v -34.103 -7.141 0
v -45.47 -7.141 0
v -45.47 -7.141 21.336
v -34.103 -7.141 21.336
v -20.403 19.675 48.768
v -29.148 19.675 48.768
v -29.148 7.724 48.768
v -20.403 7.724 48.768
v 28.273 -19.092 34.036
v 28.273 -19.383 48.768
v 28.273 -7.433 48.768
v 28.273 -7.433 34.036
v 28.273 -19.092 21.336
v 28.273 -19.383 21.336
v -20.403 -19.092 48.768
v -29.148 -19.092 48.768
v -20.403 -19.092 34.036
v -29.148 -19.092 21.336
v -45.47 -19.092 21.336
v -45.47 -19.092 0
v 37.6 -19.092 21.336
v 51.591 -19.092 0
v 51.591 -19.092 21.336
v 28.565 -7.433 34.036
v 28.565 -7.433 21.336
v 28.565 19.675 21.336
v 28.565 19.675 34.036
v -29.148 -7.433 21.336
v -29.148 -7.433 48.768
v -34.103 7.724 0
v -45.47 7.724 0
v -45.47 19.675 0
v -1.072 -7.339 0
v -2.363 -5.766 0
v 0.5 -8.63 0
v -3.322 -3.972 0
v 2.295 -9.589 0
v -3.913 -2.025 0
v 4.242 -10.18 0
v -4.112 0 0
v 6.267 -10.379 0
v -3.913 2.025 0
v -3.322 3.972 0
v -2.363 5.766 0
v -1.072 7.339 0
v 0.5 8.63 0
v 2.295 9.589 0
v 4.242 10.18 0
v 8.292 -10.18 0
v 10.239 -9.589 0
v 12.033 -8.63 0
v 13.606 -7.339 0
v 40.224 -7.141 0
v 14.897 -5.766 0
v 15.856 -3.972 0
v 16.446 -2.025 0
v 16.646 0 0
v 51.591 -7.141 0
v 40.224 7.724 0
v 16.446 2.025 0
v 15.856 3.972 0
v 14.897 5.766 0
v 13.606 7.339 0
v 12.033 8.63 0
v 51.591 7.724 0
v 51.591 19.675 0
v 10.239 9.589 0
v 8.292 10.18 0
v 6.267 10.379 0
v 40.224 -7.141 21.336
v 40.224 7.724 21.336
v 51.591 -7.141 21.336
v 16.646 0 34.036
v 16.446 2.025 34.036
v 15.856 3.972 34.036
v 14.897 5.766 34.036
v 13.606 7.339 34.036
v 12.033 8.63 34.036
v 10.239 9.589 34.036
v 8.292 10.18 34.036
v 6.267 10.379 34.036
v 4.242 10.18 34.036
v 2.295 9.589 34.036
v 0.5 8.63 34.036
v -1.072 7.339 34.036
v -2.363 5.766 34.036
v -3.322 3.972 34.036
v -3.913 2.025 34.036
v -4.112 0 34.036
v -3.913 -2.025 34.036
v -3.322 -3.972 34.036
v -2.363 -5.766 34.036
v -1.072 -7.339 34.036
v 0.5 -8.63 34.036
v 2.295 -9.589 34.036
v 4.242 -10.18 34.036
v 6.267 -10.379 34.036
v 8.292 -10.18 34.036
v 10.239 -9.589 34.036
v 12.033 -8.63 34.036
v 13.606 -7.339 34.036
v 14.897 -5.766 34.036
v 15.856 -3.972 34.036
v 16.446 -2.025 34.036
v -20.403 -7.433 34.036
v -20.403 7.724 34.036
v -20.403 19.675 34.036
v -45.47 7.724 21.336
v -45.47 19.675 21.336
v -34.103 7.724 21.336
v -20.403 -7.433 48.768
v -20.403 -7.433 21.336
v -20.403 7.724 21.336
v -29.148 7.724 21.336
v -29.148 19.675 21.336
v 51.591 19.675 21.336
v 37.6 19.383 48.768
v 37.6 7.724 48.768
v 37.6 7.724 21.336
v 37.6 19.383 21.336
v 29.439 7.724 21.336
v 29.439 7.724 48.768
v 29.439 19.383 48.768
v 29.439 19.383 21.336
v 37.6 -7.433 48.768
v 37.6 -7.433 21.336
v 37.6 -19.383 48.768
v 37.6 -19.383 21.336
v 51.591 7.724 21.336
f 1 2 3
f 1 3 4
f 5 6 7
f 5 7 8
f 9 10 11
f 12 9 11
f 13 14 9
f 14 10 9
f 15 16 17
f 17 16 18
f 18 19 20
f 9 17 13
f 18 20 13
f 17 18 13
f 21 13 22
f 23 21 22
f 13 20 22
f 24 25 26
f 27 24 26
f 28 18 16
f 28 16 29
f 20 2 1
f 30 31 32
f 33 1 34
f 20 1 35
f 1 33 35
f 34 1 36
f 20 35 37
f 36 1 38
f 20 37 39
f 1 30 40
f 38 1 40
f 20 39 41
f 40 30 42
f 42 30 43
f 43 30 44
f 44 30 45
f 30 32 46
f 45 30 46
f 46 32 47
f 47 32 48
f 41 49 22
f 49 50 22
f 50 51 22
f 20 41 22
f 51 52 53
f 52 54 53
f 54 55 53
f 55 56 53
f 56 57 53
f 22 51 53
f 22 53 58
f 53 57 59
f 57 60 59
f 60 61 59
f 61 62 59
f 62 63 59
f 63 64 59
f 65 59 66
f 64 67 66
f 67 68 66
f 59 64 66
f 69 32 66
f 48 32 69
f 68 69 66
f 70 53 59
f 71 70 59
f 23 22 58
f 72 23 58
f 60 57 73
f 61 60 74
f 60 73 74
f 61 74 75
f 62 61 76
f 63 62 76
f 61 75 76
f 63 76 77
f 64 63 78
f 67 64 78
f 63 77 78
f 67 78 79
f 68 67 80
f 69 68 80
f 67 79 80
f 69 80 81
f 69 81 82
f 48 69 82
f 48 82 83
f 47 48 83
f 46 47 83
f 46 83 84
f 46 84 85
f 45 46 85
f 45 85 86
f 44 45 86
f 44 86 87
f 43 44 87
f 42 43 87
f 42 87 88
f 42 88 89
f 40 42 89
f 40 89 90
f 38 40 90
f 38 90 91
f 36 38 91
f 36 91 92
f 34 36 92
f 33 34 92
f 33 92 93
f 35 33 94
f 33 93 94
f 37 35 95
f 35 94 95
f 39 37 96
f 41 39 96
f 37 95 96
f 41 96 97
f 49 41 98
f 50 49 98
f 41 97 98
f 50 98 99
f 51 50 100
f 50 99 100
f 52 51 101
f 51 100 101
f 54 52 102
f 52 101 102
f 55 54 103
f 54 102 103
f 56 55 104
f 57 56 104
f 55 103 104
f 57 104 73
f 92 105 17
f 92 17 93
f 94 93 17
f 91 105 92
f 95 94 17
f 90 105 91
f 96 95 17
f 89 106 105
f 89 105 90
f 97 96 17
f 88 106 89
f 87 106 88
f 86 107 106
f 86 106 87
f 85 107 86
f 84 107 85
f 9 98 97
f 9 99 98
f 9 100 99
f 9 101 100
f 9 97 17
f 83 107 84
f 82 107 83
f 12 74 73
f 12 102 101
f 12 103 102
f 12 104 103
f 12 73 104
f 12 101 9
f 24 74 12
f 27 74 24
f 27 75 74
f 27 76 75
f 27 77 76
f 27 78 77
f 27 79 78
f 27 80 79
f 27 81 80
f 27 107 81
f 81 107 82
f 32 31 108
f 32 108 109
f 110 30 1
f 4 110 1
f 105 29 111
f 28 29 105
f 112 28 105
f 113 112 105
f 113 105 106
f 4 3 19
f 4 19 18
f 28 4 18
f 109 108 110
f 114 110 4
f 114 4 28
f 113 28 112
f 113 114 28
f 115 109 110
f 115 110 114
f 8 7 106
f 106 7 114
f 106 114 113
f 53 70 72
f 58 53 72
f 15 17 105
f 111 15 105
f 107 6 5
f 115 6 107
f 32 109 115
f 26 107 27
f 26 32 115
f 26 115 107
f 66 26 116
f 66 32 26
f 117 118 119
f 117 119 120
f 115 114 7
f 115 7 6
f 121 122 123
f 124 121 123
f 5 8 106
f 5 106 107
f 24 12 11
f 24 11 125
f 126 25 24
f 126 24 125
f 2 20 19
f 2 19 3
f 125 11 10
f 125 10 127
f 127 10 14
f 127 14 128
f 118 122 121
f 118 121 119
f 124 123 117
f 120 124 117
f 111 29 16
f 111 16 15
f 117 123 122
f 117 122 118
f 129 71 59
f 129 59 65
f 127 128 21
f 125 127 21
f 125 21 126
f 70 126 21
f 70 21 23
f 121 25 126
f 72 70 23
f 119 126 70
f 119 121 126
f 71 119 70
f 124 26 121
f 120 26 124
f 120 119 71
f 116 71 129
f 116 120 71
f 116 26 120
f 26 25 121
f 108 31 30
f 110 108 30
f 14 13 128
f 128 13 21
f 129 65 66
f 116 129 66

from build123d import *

# Parameters (mm, degrees)
F0_W     = 11.3675408065
F0_H     = 11.9504919276
F0_W_2   = 11.3675370812
F0_H_2   = 11.9504933245
F1_DEPTH = 21.336
F2_W     = 48.9678680897
F2_H     = 38.7662313879
F3_DEPTH = 12.7
F4_W     = 8.7442621589
F4_H     = 11.9504933245
F4_H_2   = 11.659016367
F4_W_2   = 8.1613156945
F4_H_3   = 11.6590172984
F4_W_3   = 9.3272179365
F4_H_4   = 11.9504923932
F5_DEPTH = 27.432
F6_R     = 10.3791447845
F7_DEPTH = 76.2


with BuildPart() as f1:
    # F0 (on Top) → F1 (new body)
    with BuildSketch(Plane.XY):
        Polygon((-34.1026224196, -7.1411477402), (-34.1026224196, -19.0916396677), (40.2236096561, -19.0916396677), (40.2236096561, -7.1411477402), (40.2236096561, 7.7240983956), (40.2236096561, 19.6745917201), (-34.1026224196, 19.6745917201), (-34.1026224196, 7.7240983956), align=None)
        with Locations((-39.7863928229, -13.116393704)):
            Rectangle(F0_W, F0_H)
        with Locations((45.9073781967, -13.116393704)):
            Rectangle(F0_W_2, F0_H)
        with Locations((-39.7863928229, 13.6993450578)):
            Rectangle(F0_W, F0_H_2)
        with Locations((45.9073781967, 13.6993450578)):
            Rectangle(F0_W_2, F0_H_2)
    extrude(amount=F1_DEPTH)

    # F2 (on face) → F3 (join)
    with BuildSketch(Plane.XY.offset(21.336)):
        with Locations((4.0806550533, 0.2914760262)):
            Rectangle(F2_W, F2_H)
    extrude(amount=F3_DEPTH)

    # F4 (on face) → F5 (join)
    with BuildSketch(Plane.XY.offset(21.336)):
        with Locations((-24.775410071, 13.6993450578)):
            Rectangle(F4_W, F4_H)
        with Locations((-24.775410071, -13.2621314842)):
            Rectangle(F4_W, F4_H_2)
        with Locations((33.5196731612, 13.5536070447)):
            Rectangle(F4_W_2, F4_H_3)
        with Locations((32.9367220402, -13.4078694973)):
            Rectangle(F4_W_3, F4_H_4)
    extrude(amount=F5_DEPTH)

    # F6 (on face) → F7 (cut)
    with BuildSketch(Plane.XY.offset(34.036)):
        with Locations((6.2667215243, 0)):
            Circle(F6_R)
    extrude(amount=-F7_DEPTH, mode=Mode.SUBTRACT)


solid = f1.part
